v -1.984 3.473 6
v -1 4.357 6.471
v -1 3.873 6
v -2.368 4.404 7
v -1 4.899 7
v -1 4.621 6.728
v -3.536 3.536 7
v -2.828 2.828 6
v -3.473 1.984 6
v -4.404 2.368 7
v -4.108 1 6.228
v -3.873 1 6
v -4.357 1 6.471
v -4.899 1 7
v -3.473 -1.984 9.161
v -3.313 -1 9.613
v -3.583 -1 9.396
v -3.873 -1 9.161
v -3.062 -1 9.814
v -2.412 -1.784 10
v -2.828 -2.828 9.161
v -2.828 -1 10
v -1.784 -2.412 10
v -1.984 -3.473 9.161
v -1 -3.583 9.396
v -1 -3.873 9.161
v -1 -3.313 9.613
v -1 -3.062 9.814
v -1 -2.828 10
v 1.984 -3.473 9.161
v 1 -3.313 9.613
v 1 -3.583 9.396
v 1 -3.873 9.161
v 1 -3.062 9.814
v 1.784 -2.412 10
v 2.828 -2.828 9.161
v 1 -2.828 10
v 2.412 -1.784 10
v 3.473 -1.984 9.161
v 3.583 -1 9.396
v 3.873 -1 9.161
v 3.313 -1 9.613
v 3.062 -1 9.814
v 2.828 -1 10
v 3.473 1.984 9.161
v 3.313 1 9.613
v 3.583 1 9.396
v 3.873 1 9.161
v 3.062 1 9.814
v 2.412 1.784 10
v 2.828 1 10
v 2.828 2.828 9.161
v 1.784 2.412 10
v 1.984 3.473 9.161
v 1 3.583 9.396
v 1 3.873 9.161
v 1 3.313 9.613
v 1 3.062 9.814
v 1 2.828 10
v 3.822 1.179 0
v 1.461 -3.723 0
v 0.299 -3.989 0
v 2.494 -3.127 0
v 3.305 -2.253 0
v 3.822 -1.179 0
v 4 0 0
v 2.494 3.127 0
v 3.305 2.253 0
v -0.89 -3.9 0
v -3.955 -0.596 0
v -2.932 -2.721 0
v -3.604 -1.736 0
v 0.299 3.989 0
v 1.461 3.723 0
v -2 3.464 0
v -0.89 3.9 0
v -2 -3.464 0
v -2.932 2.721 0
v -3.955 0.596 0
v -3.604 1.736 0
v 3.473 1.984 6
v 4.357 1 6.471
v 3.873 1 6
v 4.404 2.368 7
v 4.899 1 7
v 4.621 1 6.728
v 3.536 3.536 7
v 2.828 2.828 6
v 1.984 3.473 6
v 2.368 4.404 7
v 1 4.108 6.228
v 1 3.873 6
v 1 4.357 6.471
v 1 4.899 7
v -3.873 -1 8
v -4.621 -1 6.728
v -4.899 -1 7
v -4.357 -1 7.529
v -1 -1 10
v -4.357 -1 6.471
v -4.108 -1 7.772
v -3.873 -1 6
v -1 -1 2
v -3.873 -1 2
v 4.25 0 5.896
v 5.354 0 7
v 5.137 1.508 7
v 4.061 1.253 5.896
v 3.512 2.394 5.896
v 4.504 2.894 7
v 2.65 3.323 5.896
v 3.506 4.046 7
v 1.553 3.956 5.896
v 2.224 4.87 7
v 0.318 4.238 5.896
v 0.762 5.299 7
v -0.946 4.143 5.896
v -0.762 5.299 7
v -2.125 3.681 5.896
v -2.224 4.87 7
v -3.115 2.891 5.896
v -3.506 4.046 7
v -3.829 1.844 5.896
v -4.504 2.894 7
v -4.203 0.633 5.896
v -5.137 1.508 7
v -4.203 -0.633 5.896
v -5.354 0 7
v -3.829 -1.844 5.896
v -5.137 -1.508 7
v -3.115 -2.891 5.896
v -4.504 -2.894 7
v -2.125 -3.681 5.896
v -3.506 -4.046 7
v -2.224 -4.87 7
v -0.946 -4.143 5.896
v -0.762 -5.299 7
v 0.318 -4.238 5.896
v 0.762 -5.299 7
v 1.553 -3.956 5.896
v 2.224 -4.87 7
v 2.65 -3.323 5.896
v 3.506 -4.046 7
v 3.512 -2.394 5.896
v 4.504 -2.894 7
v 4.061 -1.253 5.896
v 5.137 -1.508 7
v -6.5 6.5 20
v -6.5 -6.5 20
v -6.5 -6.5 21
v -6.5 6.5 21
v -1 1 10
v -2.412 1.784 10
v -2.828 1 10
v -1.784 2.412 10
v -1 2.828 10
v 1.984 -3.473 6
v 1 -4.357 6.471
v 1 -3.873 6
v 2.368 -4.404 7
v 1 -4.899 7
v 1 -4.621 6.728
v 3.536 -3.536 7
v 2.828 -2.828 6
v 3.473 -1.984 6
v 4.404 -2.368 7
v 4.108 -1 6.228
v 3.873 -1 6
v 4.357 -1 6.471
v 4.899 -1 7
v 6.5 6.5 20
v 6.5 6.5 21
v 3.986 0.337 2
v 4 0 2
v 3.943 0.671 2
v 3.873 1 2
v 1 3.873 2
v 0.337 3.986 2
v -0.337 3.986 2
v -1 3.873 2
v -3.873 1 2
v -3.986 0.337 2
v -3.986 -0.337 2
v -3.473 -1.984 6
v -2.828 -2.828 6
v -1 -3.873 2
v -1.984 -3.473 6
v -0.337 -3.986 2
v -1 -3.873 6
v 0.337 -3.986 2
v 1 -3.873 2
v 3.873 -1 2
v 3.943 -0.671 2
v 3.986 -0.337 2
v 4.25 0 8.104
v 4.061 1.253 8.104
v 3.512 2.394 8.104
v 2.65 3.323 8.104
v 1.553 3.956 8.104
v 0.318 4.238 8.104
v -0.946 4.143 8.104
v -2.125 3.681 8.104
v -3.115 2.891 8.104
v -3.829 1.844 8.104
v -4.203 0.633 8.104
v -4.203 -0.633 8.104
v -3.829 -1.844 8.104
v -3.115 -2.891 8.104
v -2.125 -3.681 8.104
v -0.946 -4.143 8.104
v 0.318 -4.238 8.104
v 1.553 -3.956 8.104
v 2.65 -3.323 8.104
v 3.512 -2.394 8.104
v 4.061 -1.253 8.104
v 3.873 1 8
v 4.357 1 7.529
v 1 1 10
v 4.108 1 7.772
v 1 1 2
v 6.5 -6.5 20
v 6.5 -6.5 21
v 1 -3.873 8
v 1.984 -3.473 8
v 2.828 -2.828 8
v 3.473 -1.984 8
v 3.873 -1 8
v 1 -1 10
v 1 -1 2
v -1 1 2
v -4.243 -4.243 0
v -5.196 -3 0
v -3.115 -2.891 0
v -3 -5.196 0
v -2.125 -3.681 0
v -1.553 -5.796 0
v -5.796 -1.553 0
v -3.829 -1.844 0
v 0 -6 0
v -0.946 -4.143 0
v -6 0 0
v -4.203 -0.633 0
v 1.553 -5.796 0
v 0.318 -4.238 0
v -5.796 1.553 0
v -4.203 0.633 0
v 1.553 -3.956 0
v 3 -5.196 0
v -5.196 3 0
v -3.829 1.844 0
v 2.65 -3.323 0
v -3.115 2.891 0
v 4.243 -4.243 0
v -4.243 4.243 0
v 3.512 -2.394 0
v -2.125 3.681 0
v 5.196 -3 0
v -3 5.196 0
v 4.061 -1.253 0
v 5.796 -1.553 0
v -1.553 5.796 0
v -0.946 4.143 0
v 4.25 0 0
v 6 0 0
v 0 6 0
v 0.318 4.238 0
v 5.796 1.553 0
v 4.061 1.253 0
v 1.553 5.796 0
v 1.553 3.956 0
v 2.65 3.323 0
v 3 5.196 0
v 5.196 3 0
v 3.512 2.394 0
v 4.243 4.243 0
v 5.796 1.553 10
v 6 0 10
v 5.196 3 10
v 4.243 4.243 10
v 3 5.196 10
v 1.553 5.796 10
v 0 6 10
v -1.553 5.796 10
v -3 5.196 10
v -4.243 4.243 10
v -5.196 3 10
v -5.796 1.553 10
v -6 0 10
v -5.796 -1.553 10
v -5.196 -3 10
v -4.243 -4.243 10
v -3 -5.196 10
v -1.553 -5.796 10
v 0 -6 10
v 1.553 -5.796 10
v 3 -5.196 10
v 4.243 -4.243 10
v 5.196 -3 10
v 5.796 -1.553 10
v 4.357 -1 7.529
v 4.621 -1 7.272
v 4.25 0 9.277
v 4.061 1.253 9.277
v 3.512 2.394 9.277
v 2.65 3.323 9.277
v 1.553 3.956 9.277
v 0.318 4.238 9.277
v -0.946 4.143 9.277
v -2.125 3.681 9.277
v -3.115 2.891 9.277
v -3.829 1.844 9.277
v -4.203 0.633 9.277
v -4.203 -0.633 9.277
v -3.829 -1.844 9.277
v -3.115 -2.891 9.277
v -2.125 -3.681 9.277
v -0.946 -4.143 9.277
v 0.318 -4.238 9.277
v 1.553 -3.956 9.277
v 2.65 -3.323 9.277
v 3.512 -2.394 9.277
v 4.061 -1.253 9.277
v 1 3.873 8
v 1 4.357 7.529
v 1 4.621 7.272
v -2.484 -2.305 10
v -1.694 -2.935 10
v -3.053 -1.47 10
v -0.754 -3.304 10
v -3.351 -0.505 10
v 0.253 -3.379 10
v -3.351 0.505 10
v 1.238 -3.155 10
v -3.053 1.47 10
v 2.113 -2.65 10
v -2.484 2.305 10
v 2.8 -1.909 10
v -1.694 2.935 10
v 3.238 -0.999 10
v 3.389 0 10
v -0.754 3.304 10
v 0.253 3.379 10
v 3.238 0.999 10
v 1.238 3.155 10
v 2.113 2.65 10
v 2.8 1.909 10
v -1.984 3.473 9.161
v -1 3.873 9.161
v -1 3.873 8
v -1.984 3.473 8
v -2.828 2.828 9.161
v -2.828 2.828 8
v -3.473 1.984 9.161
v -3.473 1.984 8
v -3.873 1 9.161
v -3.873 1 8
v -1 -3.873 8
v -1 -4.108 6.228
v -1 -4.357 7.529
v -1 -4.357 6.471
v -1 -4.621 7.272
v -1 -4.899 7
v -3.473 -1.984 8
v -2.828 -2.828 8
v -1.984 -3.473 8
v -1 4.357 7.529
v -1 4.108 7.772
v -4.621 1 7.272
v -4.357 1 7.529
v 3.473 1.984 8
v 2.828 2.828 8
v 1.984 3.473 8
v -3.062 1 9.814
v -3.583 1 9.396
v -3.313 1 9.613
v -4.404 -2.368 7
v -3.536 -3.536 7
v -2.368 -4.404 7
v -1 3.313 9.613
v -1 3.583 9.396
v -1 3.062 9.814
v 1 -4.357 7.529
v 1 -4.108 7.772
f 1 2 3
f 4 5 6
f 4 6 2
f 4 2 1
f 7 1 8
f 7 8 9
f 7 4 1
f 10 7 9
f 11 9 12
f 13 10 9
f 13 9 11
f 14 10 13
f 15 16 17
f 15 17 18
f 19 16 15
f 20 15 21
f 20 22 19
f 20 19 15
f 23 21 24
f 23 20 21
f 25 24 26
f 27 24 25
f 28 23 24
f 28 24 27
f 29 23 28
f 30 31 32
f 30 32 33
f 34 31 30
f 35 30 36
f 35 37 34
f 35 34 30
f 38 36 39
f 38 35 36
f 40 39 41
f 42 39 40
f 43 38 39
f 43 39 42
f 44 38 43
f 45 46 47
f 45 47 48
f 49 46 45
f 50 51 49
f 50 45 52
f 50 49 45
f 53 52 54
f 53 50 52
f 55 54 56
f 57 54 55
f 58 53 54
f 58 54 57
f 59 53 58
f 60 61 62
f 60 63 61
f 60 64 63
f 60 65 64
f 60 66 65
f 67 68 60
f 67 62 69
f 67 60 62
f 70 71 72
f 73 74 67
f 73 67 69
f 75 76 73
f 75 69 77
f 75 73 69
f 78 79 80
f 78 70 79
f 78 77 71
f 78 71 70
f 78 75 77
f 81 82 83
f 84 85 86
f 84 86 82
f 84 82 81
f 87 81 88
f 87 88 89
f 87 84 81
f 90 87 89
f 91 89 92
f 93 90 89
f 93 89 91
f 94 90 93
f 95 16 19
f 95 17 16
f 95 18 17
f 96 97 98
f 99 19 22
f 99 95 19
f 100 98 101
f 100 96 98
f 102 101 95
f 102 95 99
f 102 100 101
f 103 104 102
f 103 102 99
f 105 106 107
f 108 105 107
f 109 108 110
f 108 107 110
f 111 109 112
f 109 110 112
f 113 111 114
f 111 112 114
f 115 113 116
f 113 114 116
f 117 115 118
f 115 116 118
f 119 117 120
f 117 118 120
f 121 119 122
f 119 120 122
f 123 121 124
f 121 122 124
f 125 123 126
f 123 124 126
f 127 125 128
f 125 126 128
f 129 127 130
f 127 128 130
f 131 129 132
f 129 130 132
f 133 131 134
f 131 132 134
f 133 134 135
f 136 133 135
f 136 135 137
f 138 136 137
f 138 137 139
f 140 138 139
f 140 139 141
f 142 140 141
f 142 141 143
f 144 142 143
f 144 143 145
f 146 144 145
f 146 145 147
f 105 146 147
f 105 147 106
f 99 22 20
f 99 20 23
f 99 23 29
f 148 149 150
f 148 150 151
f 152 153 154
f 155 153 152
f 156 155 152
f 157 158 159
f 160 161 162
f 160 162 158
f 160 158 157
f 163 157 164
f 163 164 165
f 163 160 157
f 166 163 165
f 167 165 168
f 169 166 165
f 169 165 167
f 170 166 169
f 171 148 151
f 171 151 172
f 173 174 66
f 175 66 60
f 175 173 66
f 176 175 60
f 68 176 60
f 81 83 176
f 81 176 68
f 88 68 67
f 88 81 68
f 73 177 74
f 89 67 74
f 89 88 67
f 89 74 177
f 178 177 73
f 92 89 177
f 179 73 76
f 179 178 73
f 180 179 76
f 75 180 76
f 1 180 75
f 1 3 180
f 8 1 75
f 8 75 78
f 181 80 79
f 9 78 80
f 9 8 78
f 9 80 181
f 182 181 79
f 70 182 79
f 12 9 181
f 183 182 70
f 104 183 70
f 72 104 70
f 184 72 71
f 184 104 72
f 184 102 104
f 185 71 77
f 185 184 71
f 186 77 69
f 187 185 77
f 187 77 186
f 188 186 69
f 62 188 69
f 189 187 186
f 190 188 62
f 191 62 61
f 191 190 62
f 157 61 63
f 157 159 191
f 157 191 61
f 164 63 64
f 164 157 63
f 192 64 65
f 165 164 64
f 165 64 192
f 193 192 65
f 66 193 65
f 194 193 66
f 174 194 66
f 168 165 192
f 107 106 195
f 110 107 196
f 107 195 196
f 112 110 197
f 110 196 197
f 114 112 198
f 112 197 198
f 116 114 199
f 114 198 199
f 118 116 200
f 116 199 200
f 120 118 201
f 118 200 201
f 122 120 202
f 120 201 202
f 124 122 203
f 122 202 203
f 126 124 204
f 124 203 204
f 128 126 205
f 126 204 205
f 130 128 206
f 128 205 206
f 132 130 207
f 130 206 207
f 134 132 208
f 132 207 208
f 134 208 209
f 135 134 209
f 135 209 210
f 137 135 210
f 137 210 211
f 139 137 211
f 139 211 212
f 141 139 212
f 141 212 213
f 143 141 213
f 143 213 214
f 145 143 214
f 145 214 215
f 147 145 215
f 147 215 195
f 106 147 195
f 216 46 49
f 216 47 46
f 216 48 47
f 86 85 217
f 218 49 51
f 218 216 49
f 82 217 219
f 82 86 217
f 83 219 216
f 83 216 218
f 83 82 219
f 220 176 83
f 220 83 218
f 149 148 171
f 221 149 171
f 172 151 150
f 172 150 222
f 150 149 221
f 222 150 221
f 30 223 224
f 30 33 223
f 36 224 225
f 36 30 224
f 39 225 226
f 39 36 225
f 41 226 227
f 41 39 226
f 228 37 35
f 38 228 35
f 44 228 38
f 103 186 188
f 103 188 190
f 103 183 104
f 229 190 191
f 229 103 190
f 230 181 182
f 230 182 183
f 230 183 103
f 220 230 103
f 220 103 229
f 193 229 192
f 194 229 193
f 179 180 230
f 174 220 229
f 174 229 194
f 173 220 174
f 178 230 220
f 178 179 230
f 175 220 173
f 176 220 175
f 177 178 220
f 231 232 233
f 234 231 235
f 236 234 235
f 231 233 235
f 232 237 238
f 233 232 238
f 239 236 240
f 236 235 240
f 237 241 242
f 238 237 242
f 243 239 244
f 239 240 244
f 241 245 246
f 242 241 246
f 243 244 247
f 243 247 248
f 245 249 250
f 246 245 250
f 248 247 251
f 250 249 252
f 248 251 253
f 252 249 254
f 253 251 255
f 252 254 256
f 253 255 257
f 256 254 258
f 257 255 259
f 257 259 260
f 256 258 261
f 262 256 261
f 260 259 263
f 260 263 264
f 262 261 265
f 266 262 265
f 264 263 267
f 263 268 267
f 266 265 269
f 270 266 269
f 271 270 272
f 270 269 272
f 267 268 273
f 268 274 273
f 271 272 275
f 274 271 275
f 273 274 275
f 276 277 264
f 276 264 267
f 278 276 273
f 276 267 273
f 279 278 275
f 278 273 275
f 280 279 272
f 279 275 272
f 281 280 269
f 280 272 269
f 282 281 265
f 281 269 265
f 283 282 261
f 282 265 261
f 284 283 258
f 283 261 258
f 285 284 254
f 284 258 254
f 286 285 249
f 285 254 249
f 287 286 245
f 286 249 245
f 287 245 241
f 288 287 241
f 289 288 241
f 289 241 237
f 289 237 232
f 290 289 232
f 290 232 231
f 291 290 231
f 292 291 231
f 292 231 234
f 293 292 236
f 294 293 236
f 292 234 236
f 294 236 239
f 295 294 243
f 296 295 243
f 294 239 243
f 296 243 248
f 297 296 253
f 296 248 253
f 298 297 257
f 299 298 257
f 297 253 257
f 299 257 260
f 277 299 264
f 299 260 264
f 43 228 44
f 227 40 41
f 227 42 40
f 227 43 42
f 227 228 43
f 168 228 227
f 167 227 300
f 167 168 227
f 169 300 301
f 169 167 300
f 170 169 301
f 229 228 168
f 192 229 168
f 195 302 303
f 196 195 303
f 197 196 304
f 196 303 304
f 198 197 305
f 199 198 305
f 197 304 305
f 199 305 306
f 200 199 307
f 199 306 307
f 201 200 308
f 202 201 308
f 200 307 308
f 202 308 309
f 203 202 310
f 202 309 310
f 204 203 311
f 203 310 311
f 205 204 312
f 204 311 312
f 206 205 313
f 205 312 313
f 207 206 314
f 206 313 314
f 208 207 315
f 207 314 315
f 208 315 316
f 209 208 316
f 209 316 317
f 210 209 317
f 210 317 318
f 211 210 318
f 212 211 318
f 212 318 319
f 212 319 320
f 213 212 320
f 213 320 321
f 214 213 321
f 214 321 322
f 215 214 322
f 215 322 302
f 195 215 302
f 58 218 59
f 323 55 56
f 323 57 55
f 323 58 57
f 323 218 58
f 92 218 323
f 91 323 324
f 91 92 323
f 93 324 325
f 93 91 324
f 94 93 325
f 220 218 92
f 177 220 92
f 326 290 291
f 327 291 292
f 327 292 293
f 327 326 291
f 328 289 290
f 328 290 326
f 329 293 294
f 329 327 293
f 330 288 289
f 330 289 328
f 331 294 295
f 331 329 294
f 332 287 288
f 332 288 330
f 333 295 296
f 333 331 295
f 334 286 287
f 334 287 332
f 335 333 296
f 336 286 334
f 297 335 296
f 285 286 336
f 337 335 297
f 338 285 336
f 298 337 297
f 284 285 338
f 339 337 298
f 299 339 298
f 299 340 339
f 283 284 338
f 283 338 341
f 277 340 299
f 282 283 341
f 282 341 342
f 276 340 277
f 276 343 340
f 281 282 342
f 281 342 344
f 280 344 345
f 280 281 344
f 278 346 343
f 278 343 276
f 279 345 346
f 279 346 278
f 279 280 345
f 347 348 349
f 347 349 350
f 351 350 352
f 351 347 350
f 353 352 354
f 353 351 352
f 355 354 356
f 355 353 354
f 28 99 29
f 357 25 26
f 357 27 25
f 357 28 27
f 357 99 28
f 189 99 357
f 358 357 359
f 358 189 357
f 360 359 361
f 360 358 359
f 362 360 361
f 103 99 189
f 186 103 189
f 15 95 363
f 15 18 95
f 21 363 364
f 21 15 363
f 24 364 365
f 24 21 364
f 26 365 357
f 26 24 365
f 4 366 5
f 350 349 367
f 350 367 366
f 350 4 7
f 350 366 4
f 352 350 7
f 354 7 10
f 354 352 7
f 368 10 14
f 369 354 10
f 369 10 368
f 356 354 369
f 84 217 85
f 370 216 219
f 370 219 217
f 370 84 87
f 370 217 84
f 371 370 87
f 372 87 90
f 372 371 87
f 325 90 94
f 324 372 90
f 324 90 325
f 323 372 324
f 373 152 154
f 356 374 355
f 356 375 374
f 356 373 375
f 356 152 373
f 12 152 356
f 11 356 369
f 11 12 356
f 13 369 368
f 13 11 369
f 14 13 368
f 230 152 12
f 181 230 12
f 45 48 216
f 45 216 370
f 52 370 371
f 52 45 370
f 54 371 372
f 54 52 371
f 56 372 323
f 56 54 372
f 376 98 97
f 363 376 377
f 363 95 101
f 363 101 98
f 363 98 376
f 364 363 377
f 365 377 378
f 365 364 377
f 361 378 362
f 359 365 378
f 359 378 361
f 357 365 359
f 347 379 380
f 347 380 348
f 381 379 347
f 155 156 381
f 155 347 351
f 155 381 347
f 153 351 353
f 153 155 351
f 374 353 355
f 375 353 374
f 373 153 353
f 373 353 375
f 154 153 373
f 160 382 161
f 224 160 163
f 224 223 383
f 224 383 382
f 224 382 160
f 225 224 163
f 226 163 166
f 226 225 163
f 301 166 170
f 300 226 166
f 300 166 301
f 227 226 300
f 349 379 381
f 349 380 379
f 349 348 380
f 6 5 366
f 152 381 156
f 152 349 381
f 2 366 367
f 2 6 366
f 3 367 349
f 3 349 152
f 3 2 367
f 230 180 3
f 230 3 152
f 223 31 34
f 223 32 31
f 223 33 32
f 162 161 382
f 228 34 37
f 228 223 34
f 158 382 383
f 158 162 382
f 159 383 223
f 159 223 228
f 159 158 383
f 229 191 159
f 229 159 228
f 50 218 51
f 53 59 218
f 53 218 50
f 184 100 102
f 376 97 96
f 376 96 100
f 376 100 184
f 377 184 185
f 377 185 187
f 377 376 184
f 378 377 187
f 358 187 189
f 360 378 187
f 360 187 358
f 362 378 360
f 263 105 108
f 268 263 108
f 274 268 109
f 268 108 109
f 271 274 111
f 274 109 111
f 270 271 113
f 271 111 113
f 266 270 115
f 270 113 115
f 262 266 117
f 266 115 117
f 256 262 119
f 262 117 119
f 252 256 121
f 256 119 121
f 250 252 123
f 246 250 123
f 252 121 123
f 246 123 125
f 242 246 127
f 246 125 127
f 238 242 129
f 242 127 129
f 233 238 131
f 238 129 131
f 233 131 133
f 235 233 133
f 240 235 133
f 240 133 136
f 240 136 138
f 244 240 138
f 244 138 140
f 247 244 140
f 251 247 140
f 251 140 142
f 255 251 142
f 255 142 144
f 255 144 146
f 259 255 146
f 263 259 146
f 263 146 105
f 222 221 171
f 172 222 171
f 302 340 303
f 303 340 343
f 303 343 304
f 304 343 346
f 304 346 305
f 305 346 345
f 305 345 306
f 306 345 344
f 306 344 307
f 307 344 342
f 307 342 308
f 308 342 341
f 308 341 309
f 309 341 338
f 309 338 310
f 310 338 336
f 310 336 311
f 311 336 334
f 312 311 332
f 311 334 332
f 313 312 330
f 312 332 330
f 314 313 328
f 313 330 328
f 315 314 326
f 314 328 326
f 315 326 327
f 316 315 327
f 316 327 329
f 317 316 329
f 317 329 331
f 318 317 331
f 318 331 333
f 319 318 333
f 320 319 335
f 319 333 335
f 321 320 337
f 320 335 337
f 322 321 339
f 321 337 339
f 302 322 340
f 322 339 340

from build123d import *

# Parameters (mm, degrees)
F3_R      = 6
F4_DEPTH  = 10
F5_OFFSET = 0.25
F6_START  = 2
F2_W      = 2
F2_H      = 2
F6_DEPTH  = 8
F8_W      = 13
F8_H      = 13
F9_DEPTH  = 1


with BuildPart() as f1:
    # F0 (on Front) → F1 (revolve)
    with BuildSketch(Plane.XZ):
        Polygon((3, 10), (0, 10), (0, 0), (4, 0), (4, 6), (5, 7), (4, 8), (4, 9.1609003688), align=None)
    revolve(axis=Axis((0, 0, 5), (0, 0, 1)))


with BuildPart() as f4:
    # F3 (on Top) → F4 (new body, through all)
    with BuildSketch(Plane.XY):
        Circle(F3_R)
    extrude(amount=F4_DEPTH)

    # F5: cut F1, made larger all round first
    f5_tool = offset(f1.part, amount=F5_OFFSET, kind=Kind.INTERSECTION, mode=Mode.PRIVATE)
    add(f5_tool, mode=Mode.SUBTRACT)


with BuildPart() as f1_1:
    add(f1.part)

    # F2 (on Top) → F6 (cut)
    with BuildSketch(Plane.XY.offset(F6_START)):
        with BuildLine():
            ThreePointArc((0, -5), (0.50254481, -4.974680765), (1, -4.8989794856))
            Line((1, -4.8989794856), (1, -3.8729833462))
            ThreePointArc((1, -3.8729833462), (0, -4), (-1, -3.8729833462))
            Line((-1, -3.8729833462), (-1, -4.8989794856))
            ThreePointArc((-1, -4.8989794856), (-0.50254481, -4.974680765), (0, -5))
        make_face()
        with BuildLine():
            ThreePointArc((4.8989794856, -1), (4.974680765, -0.50254481), (5, 0))
            ThreePointArc((5, 0), (4.974680765, 0.50254481), (4.8989794856, 1))
            Line((4.8989794856, 1), (3.8729833462, 1))
            ThreePointArc((3.8729833462, 1), (3.9681187851, 0.5040171699), (4, 0))
            ThreePointArc((4, 0), (3.9681187851, -0.5040171699), (3.8729833462, -1))
            Line((3.8729833462, -1), (4.8989794856, -1))
        make_face()
        with BuildLine():
            Line((-3.8729833462, 1), (-4.8989794856, 1))
            ThreePointArc((-4.8989794856, 1), (-4.974680765, 0.50254481), (-5, 0))
            ThreePointArc((-5, 0), (-4.974680765, -0.50254481), (-4.8989794856, -1))
            Line((-4.8989794856, -1), (-3.8729833462, -1))
            ThreePointArc((-3.8729833462, -1), (-4, 0), (-3.8729833462, 1))
        make_face()
        with BuildLine():
            ThreePointArc((-1, -3.8729833462), (0, -4), (1, -3.8729833462))
            Line((1, -3.8729833462), (1, -2.8284271247))
            ThreePointArc((1, -2.8284271247), (0, -3), (-1, -2.8284271247))
            Line((-1, -2.8284271247), (-1, -3.8729833462))
        make_face()
        with BuildLine():
            ThreePointArc((-1, -2.8284271247), (0, -3), (1, -2.8284271247))
            Line((1, -2.8284271247), (1, -1))
            Line((1, -1), (-1, -1))
            Line((-1, -1), (-1, -2.8284271247))
        make_face()
        Rectangle(F2_W, F2_H)
        with BuildLine():
            Line((-1, -1), (-1, 1))
            Line((-1, 1), (-2.8284271247, 1))
            ThreePointArc((-2.8284271247, 1), (-3, 0), (-2.8284271247, -1))
            Line((-2.8284271247, -1), (-1, -1))
        make_face()
        with BuildLine():
            Line((-2.8284271247, 1), (-3.8729833462, 1))
            ThreePointArc((-3.8729833462, 1), (-4, 0), (-3.8729833462, -1))
            Line((-3.8729833462, -1), (-2.8284271247, -1))
            ThreePointArc((-2.8284271247, -1), (-3, 0), (-2.8284271247, 1))
        make_face()
        with BuildLine():
            ThreePointArc((3, 0), (2.956795679, 0.5073059362), (2.8284271247, 1))
            Line((2.8284271247, 1), (1, 1))
            Line((1, 1), (1, -1))
            Line((1, -1), (2.8284271247, -1))
            ThreePointArc((2.8284271247, -1), (2.956795679, -0.5073059362), (3, 0))
        make_face()
        with BuildLine():
            ThreePointArc((4, 0), (3.9681187851, 0.5040171699), (3.8729833462, 1))
            Line((3.8729833462, 1), (2.8284271247, 1))
            ThreePointArc((2.8284271247, 1), (2.956795679, 0.5073059362), (3, 0))
            ThreePointArc((3, 0), (2.956795679, -0.5073059362), (2.8284271247, -1))
            Line((2.8284271247, -1), (3.8729833462, -1))
            ThreePointArc((3.8729833462, -1), (3.9681187851, -0.5040171699), (4, 0))
        make_face()
        with BuildLine():
            Line((1, 1), (1, 2.8284271247))
            ThreePointArc((1, 2.8284271247), (0, 3), (-1, 2.8284271247))
            Line((-1, 2.8284271247), (-1, 1))
            Line((-1, 1), (1, 1))
        make_face()
        with BuildLine():
            Line((1, 2.8284271247), (1, 3.8729833462))
            ThreePointArc((1, 3.8729833462), (0, 4), (-1, 3.8729833462))
            Line((-1, 3.8729833462), (-1, 2.8284271247))
            ThreePointArc((-1, 2.8284271247), (0, 3), (1, 2.8284271247))
        make_face()
        with BuildLine():
            Line((1, 3.8729833462), (1, 4.8989794856))
            ThreePointArc((1, 4.8989794856), (0.50254481, 4.974680765), (0, 5))
            ThreePointArc((0, 5), (-0.50254481, 4.974680765), (-1, 4.8989794856))
            Line((-1, 4.8989794856), (-1, 3.8729833462))
            ThreePointArc((-1, 3.8729833462), (0, 4), (1, 3.8729833462))
        make_face()
    extrude(amount=F6_DEPTH, mode=Mode.SUBTRACT)


with BuildPart() as f9:
    # F8 (on offset) → F9 (new body)
    with BuildSketch(Plane.XY.offset(20)):
        Rectangle(F8_W, F8_H)
    extrude(amount=F9_DEPTH)


solid = Compound([f4.part, f1_1.part, f9.part])
